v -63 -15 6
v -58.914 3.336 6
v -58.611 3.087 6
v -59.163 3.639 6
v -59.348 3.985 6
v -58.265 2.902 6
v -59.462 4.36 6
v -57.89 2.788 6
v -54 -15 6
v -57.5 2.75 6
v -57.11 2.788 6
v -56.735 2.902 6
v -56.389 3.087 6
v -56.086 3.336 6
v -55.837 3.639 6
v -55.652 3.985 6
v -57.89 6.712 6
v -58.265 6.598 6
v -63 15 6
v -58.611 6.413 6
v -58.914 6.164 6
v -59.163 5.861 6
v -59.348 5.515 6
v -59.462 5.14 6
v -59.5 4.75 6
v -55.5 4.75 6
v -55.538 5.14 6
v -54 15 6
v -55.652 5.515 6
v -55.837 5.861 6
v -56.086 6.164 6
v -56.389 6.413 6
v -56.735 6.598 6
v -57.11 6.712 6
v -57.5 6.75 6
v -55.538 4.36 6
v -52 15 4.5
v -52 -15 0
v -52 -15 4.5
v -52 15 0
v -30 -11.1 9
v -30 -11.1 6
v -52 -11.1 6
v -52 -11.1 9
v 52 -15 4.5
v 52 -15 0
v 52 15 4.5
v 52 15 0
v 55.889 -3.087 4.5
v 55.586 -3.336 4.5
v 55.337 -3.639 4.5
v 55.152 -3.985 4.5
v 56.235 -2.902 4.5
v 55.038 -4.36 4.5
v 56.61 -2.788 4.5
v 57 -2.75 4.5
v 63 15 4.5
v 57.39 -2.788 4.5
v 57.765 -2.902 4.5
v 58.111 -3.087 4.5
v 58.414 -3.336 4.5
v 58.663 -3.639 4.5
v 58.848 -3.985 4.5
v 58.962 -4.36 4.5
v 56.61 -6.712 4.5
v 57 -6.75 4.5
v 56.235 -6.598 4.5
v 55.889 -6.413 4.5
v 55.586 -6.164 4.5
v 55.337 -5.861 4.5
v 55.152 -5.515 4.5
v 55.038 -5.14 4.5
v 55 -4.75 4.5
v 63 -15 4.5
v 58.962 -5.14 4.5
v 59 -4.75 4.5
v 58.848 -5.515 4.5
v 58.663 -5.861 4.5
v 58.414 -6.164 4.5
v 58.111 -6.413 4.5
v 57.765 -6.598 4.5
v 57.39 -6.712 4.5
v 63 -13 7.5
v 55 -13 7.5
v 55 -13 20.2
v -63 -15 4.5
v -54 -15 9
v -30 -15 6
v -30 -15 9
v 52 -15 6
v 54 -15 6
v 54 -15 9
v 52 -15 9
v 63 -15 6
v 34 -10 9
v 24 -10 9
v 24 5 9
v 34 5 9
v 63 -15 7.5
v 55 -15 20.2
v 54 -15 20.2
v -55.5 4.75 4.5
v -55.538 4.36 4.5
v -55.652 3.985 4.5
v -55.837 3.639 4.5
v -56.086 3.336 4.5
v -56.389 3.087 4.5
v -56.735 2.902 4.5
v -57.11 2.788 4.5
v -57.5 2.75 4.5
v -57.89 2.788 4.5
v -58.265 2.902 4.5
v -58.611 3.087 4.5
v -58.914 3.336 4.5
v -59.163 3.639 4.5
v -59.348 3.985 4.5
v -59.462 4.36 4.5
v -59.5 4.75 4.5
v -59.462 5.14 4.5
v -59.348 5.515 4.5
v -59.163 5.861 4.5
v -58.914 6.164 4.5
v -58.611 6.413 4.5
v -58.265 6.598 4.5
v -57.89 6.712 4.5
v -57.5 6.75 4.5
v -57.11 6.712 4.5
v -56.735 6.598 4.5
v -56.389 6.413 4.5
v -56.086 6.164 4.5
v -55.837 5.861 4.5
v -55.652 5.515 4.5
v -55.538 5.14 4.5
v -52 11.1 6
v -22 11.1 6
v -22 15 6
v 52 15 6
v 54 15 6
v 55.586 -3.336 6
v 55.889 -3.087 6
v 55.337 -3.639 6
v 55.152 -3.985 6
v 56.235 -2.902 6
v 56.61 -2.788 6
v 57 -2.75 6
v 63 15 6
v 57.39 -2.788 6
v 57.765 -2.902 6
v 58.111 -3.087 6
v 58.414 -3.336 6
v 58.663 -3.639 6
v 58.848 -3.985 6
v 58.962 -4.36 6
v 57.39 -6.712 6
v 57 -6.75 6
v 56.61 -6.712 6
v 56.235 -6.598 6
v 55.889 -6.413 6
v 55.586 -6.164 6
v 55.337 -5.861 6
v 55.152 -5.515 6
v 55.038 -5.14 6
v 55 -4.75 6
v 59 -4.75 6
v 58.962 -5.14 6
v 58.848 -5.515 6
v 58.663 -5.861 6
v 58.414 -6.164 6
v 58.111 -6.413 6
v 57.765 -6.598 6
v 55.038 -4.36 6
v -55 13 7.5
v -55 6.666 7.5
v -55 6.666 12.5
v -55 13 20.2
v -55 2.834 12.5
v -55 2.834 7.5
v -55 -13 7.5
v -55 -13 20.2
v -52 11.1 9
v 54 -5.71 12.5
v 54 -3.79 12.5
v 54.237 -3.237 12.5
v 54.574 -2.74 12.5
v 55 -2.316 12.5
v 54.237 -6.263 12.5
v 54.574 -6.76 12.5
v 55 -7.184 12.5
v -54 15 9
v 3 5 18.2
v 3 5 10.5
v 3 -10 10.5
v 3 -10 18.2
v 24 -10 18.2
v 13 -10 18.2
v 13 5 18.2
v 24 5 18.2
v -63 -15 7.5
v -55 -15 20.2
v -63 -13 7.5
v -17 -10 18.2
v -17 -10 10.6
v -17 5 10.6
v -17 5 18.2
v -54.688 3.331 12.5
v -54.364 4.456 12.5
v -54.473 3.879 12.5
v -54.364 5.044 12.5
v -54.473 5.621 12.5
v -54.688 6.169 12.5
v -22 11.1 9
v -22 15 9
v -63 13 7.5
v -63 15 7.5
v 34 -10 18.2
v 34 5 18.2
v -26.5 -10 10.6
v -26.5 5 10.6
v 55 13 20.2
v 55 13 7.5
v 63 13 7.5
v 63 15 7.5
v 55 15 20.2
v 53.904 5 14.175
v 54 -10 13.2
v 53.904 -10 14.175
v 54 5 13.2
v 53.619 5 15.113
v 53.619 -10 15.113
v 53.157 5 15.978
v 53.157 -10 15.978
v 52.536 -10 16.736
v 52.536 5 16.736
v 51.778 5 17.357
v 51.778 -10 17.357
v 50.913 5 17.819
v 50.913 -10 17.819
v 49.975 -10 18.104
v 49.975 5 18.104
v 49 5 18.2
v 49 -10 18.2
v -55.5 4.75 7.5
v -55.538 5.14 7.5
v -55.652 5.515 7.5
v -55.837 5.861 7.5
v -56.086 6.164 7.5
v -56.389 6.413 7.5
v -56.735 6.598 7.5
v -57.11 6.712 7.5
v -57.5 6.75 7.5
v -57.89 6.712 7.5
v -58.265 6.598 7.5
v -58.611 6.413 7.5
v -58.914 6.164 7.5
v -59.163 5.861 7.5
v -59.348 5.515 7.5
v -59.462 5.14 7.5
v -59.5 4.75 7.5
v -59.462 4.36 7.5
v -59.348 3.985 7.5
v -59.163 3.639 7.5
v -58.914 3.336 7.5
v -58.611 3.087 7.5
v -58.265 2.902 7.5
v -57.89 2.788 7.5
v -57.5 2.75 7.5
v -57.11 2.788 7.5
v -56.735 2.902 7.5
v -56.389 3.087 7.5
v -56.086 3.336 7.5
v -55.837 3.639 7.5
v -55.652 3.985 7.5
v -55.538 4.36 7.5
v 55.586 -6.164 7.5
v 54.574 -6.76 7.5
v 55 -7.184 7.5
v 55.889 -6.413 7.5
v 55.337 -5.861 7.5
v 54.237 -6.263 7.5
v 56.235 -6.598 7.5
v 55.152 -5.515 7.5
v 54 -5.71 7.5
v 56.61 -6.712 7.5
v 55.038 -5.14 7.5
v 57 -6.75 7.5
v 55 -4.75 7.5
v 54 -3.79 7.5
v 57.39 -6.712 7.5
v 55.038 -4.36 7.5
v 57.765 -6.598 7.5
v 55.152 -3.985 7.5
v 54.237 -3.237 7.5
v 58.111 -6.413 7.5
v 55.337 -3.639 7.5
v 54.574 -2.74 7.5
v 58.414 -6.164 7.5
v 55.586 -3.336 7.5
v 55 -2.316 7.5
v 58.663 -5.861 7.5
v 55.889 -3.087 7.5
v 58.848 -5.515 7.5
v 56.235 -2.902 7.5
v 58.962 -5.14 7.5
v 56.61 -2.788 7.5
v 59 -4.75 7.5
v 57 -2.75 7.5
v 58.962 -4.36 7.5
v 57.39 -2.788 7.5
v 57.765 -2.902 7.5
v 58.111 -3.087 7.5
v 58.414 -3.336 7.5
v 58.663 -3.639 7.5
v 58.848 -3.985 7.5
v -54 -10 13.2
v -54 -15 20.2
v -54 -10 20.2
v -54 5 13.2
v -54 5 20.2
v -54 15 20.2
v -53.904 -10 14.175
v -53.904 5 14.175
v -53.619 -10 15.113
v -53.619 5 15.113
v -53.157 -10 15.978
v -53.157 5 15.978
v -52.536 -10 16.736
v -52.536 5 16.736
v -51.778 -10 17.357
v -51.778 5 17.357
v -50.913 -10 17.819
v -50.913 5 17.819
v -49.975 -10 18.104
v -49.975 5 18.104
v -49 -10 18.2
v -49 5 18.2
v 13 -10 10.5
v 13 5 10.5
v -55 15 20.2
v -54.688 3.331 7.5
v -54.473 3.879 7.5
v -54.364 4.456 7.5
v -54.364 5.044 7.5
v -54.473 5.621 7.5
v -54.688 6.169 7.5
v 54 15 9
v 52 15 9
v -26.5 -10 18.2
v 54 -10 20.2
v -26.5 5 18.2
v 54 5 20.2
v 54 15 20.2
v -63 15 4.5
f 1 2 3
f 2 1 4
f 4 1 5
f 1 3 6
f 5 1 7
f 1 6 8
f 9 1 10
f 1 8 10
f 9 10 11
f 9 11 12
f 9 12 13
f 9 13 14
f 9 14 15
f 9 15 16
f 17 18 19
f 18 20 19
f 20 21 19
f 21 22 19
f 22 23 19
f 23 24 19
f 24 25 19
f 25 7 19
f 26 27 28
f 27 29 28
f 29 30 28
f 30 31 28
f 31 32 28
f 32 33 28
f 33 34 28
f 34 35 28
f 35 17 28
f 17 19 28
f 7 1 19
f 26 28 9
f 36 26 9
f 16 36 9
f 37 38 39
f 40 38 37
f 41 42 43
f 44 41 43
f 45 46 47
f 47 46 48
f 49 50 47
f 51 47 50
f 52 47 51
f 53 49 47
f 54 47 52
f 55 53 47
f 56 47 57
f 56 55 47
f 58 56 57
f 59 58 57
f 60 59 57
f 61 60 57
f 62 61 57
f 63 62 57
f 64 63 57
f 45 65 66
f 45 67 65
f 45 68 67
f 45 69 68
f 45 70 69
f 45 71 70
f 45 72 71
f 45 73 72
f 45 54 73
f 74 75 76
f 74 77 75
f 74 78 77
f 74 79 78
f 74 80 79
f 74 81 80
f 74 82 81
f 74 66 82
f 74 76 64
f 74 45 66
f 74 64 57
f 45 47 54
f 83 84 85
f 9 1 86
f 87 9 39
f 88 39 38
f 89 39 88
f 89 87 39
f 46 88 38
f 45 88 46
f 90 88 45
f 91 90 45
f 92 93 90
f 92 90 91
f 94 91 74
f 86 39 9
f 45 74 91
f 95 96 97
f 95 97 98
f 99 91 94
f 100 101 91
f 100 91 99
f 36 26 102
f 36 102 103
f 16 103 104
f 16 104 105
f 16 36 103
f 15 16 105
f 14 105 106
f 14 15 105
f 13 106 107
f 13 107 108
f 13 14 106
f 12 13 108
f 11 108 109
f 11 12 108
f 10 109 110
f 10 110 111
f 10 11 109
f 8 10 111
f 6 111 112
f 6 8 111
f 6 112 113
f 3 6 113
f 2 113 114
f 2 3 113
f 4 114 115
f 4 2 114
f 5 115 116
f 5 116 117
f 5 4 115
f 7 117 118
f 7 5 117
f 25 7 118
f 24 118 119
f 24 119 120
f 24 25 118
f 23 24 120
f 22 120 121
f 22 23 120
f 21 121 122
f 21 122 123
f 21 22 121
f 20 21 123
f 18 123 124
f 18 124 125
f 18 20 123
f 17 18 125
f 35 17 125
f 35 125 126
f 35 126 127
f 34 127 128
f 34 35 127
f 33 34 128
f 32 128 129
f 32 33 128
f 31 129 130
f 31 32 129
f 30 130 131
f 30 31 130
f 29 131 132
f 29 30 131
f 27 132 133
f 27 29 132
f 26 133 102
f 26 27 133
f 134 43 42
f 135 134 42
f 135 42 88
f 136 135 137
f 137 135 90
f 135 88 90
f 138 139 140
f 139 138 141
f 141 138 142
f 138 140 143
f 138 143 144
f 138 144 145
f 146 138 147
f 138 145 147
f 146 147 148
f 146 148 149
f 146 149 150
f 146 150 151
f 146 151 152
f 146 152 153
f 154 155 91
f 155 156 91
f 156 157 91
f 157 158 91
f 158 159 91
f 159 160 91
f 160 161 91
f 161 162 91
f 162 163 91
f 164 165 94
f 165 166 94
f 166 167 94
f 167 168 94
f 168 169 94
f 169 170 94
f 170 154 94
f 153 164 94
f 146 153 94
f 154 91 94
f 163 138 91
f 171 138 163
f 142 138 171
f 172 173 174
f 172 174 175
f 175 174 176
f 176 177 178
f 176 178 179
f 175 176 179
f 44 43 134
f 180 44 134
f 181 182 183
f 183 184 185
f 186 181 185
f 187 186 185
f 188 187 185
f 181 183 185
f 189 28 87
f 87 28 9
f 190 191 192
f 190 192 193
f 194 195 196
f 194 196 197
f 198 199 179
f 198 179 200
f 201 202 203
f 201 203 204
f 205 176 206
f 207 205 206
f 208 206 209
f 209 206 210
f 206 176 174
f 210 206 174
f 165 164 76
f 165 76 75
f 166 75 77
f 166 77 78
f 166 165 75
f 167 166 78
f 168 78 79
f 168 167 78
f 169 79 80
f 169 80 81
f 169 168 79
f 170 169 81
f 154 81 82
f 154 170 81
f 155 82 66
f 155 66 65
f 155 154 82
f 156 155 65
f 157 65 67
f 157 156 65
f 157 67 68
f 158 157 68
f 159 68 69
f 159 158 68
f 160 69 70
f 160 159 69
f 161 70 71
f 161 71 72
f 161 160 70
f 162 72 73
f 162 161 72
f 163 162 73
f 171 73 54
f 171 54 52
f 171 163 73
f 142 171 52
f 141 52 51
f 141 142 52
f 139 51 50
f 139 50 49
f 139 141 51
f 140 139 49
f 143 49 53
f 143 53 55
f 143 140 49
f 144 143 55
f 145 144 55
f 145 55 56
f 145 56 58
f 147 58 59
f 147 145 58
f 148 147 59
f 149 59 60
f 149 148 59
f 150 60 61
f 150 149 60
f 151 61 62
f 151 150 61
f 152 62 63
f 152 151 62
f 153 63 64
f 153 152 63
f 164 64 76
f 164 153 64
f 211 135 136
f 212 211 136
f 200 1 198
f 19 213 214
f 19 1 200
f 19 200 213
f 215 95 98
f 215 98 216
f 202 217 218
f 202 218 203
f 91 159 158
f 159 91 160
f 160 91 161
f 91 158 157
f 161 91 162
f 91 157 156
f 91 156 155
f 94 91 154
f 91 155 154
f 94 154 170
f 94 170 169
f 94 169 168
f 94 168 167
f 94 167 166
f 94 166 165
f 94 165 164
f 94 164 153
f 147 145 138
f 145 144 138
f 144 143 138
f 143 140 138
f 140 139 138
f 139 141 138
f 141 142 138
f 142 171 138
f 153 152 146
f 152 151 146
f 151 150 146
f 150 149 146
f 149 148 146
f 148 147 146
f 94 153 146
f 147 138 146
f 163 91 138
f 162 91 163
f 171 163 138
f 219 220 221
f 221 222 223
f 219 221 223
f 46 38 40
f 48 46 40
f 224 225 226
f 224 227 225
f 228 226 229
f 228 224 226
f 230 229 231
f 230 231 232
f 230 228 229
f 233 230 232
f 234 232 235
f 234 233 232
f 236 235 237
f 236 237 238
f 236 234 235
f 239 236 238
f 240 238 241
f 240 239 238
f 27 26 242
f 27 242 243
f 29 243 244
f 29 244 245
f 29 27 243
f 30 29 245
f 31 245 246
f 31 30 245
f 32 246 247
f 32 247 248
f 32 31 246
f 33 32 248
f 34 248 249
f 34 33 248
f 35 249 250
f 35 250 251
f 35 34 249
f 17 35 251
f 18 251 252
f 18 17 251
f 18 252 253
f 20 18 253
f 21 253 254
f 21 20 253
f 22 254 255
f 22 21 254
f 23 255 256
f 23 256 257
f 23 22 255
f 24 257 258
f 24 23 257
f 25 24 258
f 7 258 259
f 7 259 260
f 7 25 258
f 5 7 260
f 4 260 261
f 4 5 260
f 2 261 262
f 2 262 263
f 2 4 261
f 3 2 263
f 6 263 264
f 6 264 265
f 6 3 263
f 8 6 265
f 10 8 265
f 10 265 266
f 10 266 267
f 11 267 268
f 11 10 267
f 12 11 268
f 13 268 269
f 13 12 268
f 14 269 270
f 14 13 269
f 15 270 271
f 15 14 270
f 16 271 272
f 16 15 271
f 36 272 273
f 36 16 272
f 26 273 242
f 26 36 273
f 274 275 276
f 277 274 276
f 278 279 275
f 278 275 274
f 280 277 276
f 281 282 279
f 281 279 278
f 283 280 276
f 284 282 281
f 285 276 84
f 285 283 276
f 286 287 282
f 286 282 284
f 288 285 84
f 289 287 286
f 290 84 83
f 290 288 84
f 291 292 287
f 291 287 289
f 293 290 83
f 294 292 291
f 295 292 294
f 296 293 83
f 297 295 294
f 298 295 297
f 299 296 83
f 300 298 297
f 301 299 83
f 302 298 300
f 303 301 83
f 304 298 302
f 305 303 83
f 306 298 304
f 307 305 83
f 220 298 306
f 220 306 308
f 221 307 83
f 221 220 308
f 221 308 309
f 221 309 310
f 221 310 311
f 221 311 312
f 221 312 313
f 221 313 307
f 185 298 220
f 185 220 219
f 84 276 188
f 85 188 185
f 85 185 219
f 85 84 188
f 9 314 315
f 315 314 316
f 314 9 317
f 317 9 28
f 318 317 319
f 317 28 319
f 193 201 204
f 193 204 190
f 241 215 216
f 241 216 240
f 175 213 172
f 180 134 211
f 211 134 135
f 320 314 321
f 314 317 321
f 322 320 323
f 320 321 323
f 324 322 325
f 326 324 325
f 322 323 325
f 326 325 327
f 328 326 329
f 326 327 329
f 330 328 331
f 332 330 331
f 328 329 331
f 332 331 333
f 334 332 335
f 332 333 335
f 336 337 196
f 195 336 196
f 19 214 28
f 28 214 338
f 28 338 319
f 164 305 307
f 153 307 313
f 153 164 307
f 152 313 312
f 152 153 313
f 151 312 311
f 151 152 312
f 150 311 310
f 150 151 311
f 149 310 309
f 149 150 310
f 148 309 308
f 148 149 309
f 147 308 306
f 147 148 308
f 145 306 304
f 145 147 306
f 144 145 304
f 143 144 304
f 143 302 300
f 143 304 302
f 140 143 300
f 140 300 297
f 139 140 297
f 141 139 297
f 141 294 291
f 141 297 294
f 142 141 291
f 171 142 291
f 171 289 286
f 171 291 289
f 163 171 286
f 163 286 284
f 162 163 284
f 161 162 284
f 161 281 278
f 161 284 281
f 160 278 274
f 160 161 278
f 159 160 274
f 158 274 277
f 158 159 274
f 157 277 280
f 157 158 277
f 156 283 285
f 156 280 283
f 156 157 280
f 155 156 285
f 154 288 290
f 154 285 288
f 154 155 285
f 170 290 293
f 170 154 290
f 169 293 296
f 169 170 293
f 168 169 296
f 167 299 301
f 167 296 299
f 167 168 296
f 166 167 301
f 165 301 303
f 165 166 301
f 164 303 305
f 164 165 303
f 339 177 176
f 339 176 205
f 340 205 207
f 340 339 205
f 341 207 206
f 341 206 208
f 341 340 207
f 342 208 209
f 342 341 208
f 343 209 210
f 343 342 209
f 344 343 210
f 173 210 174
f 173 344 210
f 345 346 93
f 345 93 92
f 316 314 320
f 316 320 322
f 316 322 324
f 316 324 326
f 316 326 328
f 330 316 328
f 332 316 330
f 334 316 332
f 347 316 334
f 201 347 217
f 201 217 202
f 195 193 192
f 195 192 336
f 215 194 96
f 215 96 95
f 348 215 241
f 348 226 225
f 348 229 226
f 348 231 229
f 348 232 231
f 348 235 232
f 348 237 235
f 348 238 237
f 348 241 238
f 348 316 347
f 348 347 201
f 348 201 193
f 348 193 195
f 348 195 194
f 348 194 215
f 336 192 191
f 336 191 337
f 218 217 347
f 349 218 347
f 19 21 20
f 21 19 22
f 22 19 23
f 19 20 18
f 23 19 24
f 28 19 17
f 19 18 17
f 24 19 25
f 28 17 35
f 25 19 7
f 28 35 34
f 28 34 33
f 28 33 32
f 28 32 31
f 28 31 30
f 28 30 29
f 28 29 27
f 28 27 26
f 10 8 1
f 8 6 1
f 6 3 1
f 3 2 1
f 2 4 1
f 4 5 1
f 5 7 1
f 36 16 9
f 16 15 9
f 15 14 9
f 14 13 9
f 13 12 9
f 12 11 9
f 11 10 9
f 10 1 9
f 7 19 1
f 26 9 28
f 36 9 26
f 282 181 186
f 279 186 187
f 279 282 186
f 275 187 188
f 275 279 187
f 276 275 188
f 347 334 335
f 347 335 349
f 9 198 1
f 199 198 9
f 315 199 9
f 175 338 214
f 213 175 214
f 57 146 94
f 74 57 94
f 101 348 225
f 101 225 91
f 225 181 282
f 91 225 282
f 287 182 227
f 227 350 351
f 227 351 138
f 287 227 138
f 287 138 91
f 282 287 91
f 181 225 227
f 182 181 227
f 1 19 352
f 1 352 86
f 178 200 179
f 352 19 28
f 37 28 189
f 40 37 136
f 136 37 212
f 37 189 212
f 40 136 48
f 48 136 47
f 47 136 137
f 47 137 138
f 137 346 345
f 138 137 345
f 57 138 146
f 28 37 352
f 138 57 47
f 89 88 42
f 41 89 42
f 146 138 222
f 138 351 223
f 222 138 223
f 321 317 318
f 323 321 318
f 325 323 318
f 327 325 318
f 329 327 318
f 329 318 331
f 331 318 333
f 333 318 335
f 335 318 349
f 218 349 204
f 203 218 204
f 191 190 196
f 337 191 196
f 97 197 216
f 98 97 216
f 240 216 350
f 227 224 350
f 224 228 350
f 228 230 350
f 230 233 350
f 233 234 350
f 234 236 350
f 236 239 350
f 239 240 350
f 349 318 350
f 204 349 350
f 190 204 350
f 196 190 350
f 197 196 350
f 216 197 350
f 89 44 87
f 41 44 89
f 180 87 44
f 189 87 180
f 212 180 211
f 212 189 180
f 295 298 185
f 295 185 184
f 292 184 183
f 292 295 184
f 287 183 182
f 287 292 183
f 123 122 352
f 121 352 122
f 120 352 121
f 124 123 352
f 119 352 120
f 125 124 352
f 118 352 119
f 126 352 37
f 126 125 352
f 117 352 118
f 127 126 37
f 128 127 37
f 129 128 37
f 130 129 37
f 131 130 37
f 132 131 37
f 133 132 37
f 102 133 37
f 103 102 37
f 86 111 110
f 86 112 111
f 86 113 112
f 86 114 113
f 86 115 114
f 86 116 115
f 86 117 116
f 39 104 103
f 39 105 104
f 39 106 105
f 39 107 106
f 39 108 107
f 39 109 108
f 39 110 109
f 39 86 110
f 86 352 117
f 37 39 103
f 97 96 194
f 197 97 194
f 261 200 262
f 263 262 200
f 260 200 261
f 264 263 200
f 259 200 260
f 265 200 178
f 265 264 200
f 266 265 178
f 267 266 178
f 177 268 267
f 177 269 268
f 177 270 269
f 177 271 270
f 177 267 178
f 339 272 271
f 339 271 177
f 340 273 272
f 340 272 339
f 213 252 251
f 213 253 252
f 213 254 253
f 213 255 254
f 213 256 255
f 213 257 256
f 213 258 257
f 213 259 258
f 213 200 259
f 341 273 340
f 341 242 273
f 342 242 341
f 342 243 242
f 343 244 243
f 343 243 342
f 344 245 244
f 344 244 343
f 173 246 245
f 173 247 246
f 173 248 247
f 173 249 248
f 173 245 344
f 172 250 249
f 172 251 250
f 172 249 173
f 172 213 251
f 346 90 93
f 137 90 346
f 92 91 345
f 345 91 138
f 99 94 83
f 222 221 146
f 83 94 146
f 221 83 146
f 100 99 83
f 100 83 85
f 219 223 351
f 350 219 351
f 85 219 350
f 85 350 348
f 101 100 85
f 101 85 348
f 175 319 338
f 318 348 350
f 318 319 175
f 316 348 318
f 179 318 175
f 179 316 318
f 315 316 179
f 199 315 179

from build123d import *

# Parameters (mm, degrees)
SKETCH1_W             = 30
SKETCH1_H             = 104
BOSS_EXTRUDE1_DEPTH   = 6
BOSS_EXTRUDE2_START   = -6
SKETCH2_W             = 11
SKETCH2_H             = 30
SKETCH2_R             = 2
BOSS_EXTRUDE2_DEPTH   = 1.5
SKETCH4_W             = 2
SKETCH4_H             = 30
BOSS_EXTRUDE5_DEPTH   = 3
SKETCH4_3_W           = 9
SKETCH4_3_H           = 30
SKETCH4_3_R           = 2
BOSS_EXTRUDE6_DEPTH   = 1.5
BOSS_EXTRUDE6_2_DEPTH = 1.5
BOSS_EXTRUDE7_DEPTH   = 2
BOSS_EXTRUDE8_START   = -30
BOSS_EXTRUDE8_DEPTH   = 2
BOSS_EXTRUDE9_REACH   = 74.643
SKETCH5_4_W           = 1
SKETCH5_4_H           = 12.7
BOSS_EXTRUDE10_START  = -5
SKETCH5_5_W           = 9.5
SKETCH5_5_H           = 7.6
SKETCH5_5_W_2         = 10
SKETCH5_5_H_2         = 7.7
SKETCH5_5_H_3         = 9.2
BOSS_EXTRUDE10_DEPTH  = 15
FILLET1_R             = 5
SKETCH6_R             = 3.15
CUT_EXTRUDE3_DEPTH    = 5


with BuildPart() as part:
    # Sketch1 → Boss-Extrude1 (new body)
    with BuildSketch(Plane(origin=(0, 0, 0), x_dir=(0, 1, 0), z_dir=(0, 0, 1))):
        Rectangle(SKETCH1_W, SKETCH1_H)
    extrude(amount=BOSS_EXTRUDE1_DEPTH)

    # Sketch2 → Boss-Extrude2 (add)
    # profile 1 of 2: a face of its own
    with BuildSketch(Plane(origin=(0, 0, 0), x_dir=(1, 0, 0), z_dir=(0, 0, -1)).offset(BOSS_EXTRUDE2_START)):
        with Locations((-57.5, 0)):
            Rectangle(SKETCH2_W, SKETCH2_H)
        with Locations((-57.5, -4.75)):
            Circle(SKETCH2_R, mode=Mode.SUBTRACT)
    # profile 2 of 2: a face of its own
    with BuildSketch(Plane(origin=(0, 0, 0), x_dir=(1, 0, 0), z_dir=(0, 0, -1)).offset(BOSS_EXTRUDE2_START)):
        with Locations((57.5, 0)):
            Rectangle(SKETCH2_W, SKETCH2_H)
        with Locations((57, 4.75)):
            Circle(SKETCH2_R, mode=Mode.SUBTRACT)
    extrude(amount=BOSS_EXTRUDE2_DEPTH)

    # Sketch4 → Boss-Extrude5 (add)
    with BuildSketch(Plane.XY.offset(6)):
        Polygon((-22, 11.1), (-22, 15), (-54, 15), (-54, -15), (-30, -15), (-30, -11.1), (-52, -11.1), (-52, 11.1), align=None)
        with Locations((53, 0)):
            Rectangle(SKETCH4_W, SKETCH4_H)
    extrude(amount=BOSS_EXTRUDE5_DEPTH)


with BuildPart() as body_2:
    # Sketch4<3> → Boss-Extrude6 (new body)
    with BuildSketch(Plane.XY.offset(6)):
        with Locations((-58.5, 0)):
            Rectangle(SKETCH4_3_W, SKETCH4_3_H)
        with Locations((-57.5, 4.75)):
            Circle(SKETCH4_3_R, mode=Mode.SUBTRACT)
    extrude(amount=BOSS_EXTRUDE6_DEPTH)



with BuildPart() as body_3:
    # Sketch4<3> → Boss-Extrude6 2 (new body)
    with BuildSketch(Plane.XY.offset(6)):
        with Locations((58.5, 0)):
            Rectangle(SKETCH4_3_W, SKETCH4_3_H)
        with Locations((57, -4.75)):
            Circle(SKETCH4_3_R, mode=Mode.SUBTRACT)
    extrude(amount=BOSS_EXTRUDE6_2_DEPTH)


with BuildPart() as body_2_1:
    add(body_2.part)

    add(body_3.part)  # Boss-Extrude7 merges body 3
    # Sketch5 → Boss-Extrude7 (add)
    with BuildSketch(Plane.XZ.offset(15)):
        Polygon((-55, 20.2), (-63, 7.5), (-54, 7.5), (-54, 20.2), align=None)
        Polygon((55, 20.2), (54, 20.2), (54, 7.5), (63, 7.5), align=None)
    extrude(amount=-BOSS_EXTRUDE7_DEPTH)

    # Sketch5<3> → Boss-Extrude8 (add)
    with BuildSketch(Plane.XZ.offset(15).offset(BOSS_EXTRUDE8_START)):
        Polygon((-55, 20.2), (-63, 7.5), (-54, 7.5), (-54, 20.2), align=None)
        Polygon((55, 20.2), (54, 20.2), (54, 7.5), (63, 7.5), align=None)
    extrude(amount=BOSS_EXTRUDE8_DEPTH)

    # Boss-Extrude9: up to this face of the body (flat: up to its plane)
    boss_extrude9_end = Plane(body_2_1.part.faces().sort_by_distance((57.29047619, 15, 11.208744589))[0])
    # Sketch5<4> → Boss-Extrude9 (add, up to the picked face)
    with BuildSketch(Plane.XZ.offset(15), mode=Mode.PRIVATE) as boss_extrude9_sk1:
        with Locations((-54.5, 13.85)):
            Rectangle(SKETCH5_4_W, SKETCH5_4_H)
    boss_extrude9_tool1 = split(extrude(boss_extrude9_sk1.sketch, amount=-BOSS_EXTRUDE9_REACH, mode=Mode.PRIVATE), bisect_by=boss_extrude9_end, keep=Keep.BOTH, mode=Mode.PRIVATE)
    # Sketch5<4> → Boss-Extrude9 (add, up to the picked face)
    with BuildSketch(Plane.XZ.offset(15), mode=Mode.PRIVATE) as boss_extrude9_sk2:
        with Locations((54.5, 13.85)):
            Rectangle(SKETCH5_4_W, SKETCH5_4_H)
    boss_extrude9_tool2 = split(extrude(boss_extrude9_sk2.sketch, amount=-BOSS_EXTRUDE9_REACH, mode=Mode.PRIVATE), bisect_by=boss_extrude9_end, keep=Keep.BOTH, mode=Mode.PRIVATE)
    add(boss_extrude9_tool1.solids().sort_by(Axis((-54.5, -15, 13.85), (0, 1, 0)))[0])
    add(boss_extrude9_tool2.solids().sort_by(Axis((54.5, -15, 13.85), (0, 1, 0)))[0])

    # Sketch5<5> → Boss-Extrude10 (add)
    with BuildSketch(Plane.XZ.offset(15).offset(BOSS_EXTRUDE10_START)):
        with Locations((-21.75, 14.4)):
            Rectangle(SKETCH5_5_W, SKETCH5_5_H)
        with Locations((8, 14.35)):
            Rectangle(SKETCH5_5_W_2, SKETCH5_5_H_2)
        with Locations((29, 13.6)):
            Rectangle(SKETCH5_5_W_2, SKETCH5_5_H_3)
        Polygon((54, 20.2), (-54, 20.2), (-54, 18.2), (-26.5, 18.2), (-17, 18.2), (3, 18.2), (13, 18.2), (24, 18.2), (34, 18.2), (54, 18.2), align=None)
    extrude(amount=-BOSS_EXTRUDE10_DEPTH)

    # Fillet1
    fillet1_edges = [body_2_1.edges().sort_by_distance(p)[0] for p in [
        (-54, -2.5, 18.2),
        (54, -2.5, 18.2),
    ]]
    fillet(fillet1_edges, radius=FILLET1_R)

    # Sketch6 → Cut-Extrude3 (cut)
    with BuildSketch(Plane.XY.offset(7.5)):
        with Locations((57, -4.75)):
            Circle(SKETCH6_R)
        with Locations((-57.5, 4.75)):
            Circle(SKETCH6_R)
    extrude(amount=CUT_EXTRUDE3_DEPTH, mode=Mode.SUBTRACT)


solid = Compound([part.part, body_2_1.part])
